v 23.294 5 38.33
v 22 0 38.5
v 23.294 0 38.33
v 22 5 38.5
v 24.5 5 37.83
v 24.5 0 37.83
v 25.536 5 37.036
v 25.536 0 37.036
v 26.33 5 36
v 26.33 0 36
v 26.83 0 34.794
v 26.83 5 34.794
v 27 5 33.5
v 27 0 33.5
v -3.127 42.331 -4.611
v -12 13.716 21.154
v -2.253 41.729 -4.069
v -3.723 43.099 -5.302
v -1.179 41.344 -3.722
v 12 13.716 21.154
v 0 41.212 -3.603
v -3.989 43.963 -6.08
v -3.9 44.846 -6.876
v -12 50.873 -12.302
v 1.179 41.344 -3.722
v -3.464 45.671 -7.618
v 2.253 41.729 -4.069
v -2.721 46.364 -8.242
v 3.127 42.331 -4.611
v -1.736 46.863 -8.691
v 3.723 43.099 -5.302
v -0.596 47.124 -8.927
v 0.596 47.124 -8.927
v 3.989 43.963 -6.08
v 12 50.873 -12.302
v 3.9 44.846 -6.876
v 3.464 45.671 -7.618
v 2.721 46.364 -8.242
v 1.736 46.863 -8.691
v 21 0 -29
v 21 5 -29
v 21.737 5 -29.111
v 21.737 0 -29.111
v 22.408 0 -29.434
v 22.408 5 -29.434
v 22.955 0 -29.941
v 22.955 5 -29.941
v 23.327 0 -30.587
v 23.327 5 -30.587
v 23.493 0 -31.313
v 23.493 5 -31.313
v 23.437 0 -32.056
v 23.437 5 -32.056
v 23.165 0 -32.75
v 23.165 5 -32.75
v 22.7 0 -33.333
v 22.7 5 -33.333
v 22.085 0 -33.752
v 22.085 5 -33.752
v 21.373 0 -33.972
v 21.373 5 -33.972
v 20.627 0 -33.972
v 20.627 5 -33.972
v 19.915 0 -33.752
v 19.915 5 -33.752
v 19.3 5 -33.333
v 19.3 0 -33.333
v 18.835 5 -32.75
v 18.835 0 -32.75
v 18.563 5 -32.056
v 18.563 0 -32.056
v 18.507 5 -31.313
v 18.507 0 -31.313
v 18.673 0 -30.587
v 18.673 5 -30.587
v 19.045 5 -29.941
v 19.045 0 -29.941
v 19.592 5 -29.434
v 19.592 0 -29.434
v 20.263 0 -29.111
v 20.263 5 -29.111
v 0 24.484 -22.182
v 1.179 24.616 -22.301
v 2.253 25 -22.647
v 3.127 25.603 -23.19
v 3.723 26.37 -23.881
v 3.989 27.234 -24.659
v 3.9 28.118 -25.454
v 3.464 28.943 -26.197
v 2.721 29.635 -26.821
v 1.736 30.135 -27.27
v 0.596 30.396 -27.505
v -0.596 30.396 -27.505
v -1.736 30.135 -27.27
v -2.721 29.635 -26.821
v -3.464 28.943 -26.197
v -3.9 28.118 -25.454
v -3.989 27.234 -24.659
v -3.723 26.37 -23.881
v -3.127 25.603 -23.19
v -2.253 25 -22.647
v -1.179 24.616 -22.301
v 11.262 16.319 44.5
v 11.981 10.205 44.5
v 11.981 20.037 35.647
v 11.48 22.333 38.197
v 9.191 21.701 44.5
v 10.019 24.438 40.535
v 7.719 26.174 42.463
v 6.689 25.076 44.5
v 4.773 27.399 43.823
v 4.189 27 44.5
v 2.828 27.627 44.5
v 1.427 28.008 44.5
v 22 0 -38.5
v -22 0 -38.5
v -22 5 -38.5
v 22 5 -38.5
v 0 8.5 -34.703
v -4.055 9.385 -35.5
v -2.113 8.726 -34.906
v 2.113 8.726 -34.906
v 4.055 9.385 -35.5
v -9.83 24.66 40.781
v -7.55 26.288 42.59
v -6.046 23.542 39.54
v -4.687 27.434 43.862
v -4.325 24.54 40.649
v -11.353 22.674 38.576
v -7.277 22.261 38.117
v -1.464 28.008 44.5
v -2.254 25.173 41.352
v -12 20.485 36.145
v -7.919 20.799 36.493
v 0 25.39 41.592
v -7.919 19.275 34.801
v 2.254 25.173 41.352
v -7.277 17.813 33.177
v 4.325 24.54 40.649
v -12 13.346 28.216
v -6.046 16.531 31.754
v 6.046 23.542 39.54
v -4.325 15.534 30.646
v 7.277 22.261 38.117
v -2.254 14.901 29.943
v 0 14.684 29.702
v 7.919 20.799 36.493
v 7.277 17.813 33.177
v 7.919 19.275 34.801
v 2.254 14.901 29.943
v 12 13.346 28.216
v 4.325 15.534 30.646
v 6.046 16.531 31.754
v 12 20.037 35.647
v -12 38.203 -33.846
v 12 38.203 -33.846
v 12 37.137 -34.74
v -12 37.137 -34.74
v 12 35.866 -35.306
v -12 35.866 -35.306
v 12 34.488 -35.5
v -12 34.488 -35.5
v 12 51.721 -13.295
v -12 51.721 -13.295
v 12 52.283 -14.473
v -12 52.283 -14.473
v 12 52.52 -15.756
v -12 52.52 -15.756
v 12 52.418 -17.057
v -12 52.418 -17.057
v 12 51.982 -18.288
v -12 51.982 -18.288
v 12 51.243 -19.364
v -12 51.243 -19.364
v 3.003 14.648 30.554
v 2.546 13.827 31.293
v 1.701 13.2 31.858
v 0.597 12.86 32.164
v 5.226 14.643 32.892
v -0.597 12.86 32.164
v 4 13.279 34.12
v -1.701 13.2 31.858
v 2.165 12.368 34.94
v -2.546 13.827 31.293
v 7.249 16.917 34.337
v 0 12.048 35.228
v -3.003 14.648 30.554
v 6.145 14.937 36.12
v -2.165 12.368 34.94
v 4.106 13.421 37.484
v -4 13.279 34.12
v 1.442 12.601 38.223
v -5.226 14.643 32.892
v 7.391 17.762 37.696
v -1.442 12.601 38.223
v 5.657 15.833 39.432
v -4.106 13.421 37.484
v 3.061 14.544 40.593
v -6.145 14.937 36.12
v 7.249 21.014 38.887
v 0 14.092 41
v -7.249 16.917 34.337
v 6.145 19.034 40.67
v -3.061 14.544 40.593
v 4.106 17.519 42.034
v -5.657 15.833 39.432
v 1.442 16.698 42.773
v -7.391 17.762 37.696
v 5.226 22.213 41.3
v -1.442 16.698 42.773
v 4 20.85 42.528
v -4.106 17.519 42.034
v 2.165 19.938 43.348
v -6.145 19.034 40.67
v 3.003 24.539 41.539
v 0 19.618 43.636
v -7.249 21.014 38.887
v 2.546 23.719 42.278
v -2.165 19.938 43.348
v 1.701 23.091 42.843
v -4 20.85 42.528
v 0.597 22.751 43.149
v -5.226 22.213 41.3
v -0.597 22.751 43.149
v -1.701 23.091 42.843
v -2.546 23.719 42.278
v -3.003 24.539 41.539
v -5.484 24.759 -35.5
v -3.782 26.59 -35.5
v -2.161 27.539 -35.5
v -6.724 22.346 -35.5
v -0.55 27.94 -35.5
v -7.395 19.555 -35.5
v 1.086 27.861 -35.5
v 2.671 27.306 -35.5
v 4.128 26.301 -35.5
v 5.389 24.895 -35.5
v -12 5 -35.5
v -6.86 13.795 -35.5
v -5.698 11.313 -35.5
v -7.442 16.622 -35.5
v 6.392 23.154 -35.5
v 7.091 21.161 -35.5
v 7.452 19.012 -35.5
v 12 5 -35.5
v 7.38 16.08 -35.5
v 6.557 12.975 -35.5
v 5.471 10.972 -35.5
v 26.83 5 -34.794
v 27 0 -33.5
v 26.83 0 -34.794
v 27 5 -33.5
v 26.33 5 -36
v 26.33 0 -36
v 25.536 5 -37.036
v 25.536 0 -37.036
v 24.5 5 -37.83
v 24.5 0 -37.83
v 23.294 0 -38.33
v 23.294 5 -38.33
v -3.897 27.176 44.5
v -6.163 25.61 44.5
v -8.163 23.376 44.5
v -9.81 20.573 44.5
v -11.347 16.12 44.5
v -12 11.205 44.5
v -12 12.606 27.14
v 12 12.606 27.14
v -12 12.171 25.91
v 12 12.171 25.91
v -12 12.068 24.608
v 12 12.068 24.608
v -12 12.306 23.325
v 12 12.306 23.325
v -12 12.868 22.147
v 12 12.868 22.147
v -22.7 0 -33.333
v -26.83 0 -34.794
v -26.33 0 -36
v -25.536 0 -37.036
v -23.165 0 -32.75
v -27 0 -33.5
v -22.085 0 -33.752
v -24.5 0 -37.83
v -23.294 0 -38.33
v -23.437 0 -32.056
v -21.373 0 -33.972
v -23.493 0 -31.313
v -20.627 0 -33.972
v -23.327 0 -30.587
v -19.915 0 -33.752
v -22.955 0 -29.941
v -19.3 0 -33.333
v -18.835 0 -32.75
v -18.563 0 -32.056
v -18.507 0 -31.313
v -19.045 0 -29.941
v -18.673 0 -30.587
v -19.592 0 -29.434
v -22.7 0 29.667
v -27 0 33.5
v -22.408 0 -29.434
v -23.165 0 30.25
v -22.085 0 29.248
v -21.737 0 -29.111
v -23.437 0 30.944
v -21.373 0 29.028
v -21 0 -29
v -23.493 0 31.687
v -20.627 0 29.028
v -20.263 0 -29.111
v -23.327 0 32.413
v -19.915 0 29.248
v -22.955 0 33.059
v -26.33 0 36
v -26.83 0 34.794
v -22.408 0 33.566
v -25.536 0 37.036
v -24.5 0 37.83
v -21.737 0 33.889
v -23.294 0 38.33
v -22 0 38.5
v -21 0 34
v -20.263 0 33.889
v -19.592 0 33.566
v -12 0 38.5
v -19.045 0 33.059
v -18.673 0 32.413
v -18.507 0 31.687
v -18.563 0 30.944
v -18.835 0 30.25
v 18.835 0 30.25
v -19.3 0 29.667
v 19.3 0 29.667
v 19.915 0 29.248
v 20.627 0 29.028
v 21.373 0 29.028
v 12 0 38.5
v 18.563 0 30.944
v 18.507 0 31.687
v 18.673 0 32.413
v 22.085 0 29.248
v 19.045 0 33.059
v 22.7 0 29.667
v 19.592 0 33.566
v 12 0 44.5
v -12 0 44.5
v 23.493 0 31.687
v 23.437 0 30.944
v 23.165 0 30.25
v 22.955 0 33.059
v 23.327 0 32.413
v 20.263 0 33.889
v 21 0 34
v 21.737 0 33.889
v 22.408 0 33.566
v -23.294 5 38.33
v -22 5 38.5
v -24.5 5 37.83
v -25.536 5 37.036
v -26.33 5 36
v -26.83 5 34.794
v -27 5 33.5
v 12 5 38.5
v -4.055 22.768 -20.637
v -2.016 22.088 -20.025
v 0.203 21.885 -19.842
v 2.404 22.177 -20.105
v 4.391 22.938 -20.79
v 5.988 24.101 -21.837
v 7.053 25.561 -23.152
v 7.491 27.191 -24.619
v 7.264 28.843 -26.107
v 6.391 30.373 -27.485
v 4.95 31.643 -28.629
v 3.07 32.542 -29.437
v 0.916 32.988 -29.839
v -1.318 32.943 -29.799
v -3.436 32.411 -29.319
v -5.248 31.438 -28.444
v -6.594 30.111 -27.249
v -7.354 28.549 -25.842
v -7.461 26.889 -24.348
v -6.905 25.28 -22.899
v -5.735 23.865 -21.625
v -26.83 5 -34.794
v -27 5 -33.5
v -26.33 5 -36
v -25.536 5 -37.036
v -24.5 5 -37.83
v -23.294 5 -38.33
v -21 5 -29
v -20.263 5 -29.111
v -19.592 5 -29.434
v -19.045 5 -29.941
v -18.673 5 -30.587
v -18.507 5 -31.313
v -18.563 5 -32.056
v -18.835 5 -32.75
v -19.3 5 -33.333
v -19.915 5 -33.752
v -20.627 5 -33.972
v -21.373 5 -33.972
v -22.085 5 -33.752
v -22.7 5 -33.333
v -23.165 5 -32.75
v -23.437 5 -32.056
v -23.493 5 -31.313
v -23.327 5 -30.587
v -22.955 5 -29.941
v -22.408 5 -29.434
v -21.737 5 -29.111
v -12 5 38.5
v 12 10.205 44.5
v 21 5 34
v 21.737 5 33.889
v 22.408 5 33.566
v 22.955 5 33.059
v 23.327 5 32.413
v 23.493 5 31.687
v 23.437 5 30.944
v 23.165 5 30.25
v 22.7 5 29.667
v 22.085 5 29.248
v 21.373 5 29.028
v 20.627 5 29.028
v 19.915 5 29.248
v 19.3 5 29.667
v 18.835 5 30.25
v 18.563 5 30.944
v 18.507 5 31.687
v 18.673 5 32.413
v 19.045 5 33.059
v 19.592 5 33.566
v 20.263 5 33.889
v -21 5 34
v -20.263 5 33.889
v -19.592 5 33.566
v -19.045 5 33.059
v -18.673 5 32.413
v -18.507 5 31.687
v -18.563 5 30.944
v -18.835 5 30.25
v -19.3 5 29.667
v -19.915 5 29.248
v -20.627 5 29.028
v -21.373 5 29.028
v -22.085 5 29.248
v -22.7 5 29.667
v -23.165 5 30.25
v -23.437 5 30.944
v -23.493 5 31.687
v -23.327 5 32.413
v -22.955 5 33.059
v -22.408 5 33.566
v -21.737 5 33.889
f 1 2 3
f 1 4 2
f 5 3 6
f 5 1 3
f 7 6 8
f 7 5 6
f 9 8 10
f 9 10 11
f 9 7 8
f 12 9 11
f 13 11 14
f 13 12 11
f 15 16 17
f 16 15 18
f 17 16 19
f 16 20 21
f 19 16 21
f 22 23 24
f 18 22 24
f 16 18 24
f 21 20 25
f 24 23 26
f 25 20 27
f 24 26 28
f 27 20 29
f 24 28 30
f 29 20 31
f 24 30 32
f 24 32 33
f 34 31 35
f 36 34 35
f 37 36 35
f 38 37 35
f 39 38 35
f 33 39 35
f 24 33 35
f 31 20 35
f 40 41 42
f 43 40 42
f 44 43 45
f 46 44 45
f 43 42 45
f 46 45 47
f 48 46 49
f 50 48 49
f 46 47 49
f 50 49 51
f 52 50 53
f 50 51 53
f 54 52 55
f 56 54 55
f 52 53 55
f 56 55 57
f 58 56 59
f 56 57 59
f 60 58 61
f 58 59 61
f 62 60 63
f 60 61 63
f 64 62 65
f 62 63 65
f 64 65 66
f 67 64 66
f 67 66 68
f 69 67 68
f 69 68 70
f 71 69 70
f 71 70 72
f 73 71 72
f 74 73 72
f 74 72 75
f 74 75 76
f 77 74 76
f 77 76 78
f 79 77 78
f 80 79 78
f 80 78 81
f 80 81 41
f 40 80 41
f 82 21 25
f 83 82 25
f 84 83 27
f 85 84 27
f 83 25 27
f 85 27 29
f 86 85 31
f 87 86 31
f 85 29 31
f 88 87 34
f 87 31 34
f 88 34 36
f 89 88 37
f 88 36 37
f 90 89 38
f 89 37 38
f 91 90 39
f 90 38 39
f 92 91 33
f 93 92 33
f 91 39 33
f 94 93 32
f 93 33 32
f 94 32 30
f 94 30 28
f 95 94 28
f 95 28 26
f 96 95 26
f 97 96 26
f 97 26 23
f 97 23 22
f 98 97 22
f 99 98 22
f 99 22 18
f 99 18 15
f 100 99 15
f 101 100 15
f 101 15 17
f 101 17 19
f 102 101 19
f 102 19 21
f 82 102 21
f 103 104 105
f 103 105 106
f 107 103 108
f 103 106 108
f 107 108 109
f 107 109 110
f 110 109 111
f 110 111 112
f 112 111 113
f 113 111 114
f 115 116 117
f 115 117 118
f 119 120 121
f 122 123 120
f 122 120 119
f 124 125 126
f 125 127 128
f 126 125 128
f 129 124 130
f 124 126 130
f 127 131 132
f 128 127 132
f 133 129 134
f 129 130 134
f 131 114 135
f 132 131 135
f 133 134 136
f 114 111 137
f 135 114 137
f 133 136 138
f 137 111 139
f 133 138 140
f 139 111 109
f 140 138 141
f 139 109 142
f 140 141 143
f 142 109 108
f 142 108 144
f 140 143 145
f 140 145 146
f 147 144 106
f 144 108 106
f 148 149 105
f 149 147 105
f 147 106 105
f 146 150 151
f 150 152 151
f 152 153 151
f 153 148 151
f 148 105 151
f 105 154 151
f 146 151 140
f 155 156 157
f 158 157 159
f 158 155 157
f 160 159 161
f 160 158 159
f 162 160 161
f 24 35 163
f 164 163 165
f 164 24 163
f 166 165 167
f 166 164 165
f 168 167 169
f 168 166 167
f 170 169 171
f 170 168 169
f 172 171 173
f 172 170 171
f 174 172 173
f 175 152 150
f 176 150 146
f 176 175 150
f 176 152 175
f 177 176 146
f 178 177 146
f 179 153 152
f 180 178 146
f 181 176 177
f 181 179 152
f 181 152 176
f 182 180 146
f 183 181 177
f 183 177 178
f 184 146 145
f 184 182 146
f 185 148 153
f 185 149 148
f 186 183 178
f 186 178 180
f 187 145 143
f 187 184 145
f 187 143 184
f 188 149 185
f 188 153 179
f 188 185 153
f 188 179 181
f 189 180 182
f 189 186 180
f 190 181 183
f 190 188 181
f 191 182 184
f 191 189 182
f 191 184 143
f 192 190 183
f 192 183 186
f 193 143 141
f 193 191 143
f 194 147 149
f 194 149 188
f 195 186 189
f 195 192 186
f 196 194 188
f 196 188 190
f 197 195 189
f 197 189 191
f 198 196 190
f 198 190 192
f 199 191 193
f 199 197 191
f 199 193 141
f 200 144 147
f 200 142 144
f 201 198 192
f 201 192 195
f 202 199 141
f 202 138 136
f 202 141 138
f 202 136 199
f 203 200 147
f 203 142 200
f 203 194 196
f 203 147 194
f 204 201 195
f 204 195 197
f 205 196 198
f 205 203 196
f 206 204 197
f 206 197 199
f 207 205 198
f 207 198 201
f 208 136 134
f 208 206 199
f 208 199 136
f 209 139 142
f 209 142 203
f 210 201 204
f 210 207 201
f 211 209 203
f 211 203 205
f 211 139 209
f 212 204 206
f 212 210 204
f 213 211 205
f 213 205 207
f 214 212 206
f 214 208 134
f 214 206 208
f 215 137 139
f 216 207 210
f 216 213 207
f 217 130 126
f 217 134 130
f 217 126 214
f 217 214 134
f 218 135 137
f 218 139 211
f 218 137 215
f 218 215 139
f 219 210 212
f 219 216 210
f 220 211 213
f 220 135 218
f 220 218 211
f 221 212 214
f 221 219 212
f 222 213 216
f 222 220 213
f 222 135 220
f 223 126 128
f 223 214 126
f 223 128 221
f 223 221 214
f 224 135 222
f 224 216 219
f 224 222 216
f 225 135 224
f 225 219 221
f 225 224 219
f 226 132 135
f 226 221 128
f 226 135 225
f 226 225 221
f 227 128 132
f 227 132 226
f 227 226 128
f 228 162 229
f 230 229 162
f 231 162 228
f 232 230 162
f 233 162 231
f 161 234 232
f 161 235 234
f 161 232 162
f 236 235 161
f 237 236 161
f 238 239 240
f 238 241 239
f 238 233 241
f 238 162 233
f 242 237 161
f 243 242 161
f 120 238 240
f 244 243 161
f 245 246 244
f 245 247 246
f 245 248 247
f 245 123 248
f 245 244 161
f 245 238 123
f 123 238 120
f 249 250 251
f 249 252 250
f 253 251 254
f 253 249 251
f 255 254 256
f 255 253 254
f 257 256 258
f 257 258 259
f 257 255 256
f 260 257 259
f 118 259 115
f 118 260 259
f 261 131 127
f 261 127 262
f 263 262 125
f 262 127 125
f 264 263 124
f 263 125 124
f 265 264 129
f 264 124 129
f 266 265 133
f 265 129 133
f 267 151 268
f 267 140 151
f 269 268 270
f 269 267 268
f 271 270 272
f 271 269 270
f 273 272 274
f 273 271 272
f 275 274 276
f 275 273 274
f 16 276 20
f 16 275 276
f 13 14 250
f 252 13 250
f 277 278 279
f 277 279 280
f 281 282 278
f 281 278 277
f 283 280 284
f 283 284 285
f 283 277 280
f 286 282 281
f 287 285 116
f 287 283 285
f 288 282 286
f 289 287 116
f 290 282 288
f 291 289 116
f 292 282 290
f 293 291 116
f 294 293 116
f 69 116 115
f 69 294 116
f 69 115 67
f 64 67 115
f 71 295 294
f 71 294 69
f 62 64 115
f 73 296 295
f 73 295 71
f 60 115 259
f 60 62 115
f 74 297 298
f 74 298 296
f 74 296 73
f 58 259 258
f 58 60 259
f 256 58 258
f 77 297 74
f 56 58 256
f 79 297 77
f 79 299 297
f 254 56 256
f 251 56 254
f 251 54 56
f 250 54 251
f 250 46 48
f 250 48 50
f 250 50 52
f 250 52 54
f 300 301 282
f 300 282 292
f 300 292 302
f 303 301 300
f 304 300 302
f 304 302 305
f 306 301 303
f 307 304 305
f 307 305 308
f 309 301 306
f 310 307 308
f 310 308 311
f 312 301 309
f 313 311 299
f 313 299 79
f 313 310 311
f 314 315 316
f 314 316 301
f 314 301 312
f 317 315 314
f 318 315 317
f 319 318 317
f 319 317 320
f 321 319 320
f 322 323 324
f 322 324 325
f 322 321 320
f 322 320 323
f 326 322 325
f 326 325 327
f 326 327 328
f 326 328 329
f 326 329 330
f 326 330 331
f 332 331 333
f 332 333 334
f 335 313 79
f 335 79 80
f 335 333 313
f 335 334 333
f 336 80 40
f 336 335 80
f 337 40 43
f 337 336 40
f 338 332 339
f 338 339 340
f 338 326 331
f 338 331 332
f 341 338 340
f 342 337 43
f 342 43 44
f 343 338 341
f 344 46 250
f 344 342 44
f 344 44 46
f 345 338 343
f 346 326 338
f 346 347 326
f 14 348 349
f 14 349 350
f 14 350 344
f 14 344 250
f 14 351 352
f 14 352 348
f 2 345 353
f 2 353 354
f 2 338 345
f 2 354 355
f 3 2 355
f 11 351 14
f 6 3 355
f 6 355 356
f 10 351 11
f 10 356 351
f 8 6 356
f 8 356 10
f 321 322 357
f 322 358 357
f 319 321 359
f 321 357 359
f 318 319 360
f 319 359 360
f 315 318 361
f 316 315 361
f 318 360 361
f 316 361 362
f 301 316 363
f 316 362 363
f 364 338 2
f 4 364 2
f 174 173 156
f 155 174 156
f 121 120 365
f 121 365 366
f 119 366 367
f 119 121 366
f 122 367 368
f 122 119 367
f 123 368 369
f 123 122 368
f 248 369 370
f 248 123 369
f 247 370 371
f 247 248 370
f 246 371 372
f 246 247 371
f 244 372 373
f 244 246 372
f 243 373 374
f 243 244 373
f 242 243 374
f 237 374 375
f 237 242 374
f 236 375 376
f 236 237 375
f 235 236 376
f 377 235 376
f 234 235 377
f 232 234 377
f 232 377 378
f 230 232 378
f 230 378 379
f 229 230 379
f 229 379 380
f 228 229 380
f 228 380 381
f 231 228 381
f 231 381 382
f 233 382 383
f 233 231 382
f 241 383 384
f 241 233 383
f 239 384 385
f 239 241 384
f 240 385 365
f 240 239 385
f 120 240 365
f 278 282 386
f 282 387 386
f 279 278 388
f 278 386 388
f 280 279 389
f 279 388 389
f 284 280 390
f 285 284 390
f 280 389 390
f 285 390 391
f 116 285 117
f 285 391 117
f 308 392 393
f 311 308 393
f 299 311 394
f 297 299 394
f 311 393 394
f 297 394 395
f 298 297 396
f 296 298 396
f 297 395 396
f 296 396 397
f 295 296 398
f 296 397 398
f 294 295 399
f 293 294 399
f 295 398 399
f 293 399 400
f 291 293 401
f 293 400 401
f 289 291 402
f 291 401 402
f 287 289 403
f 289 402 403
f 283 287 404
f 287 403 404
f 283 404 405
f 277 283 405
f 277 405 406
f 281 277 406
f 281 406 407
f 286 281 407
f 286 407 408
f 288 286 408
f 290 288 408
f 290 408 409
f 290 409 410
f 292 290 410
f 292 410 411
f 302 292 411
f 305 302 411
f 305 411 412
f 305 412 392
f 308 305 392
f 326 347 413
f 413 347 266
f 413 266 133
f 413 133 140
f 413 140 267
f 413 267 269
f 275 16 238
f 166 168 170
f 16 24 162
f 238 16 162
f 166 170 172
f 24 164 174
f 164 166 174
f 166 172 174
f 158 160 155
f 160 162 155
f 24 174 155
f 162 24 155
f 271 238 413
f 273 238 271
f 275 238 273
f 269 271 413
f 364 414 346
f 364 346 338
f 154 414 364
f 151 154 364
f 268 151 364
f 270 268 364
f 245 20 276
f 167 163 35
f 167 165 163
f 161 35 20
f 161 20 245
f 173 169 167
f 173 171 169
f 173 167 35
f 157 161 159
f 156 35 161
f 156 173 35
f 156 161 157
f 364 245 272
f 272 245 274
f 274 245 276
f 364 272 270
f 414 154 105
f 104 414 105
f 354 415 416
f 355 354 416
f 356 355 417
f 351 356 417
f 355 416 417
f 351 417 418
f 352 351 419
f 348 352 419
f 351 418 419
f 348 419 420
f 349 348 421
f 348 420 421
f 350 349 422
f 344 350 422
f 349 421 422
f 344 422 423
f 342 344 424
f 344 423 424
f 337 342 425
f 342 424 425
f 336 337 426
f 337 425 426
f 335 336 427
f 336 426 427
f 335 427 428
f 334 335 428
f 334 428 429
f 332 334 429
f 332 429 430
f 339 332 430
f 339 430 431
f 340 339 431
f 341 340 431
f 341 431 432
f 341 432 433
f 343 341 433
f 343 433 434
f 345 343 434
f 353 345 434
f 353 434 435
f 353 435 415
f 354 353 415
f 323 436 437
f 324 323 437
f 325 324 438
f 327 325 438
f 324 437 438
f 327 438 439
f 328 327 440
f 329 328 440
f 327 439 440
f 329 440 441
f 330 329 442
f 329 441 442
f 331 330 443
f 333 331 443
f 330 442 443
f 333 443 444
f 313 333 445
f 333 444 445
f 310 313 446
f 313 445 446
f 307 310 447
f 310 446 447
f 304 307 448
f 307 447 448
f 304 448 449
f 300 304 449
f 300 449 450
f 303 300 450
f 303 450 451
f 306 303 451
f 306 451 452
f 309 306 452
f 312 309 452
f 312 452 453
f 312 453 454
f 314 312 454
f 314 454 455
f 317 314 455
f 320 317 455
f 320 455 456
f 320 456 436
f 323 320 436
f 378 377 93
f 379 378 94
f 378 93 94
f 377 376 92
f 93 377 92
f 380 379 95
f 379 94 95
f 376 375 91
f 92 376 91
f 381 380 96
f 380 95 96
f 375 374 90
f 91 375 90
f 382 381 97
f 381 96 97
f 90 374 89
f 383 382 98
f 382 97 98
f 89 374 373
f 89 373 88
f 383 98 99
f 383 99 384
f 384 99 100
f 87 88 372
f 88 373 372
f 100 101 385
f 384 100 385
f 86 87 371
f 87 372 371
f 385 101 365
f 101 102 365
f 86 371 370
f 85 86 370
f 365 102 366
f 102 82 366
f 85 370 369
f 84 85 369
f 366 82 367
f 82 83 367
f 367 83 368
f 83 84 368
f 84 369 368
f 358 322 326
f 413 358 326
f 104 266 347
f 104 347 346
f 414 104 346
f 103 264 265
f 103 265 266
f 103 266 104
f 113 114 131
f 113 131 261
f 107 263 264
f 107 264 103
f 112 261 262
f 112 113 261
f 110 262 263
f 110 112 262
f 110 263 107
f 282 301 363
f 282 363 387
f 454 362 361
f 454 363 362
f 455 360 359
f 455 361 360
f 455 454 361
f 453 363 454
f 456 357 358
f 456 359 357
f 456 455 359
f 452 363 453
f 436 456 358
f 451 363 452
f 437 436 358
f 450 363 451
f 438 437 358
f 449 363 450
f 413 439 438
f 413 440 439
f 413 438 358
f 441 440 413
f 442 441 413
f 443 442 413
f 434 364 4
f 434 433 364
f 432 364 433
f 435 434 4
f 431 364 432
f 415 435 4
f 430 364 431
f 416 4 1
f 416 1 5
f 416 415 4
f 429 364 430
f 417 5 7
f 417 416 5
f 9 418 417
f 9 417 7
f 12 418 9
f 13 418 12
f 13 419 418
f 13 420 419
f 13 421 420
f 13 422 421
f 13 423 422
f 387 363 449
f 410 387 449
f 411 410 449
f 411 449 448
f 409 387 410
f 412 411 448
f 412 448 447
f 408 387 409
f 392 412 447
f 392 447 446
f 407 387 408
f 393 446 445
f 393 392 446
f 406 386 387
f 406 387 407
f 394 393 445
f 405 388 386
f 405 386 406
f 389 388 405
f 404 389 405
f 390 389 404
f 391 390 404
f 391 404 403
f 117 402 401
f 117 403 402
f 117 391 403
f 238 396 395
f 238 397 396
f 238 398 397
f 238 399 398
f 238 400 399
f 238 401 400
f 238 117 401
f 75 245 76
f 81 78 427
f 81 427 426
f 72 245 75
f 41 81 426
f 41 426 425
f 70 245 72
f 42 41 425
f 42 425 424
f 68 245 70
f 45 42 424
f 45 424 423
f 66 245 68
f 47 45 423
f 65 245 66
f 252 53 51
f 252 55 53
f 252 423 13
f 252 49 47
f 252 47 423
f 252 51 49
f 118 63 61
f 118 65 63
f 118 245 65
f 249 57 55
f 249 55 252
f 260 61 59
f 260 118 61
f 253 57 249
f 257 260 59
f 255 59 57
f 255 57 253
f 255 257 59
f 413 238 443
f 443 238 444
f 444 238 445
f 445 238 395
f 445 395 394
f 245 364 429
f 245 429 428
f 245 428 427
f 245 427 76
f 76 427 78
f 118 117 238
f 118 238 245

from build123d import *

# Parameters (mm, degrees)
SKETCH1_W                       = 54
SKETCH1_H                       = 77
BOSS_EXTRUDE1_DEPTH             = 5
SKETCH3_W                       = 24
SKETCH3_H                       = 80
BOSS_EXTRUDE2_DEPTH             = 60
BOSS_EXTRUDE2_DIRECTION_2_REACH = 49.289
CUT_EXTRUDE5_DEPTH              = 88.89908987
SKETCH9_R                       = 4
CUT_EXTRUDE7_DEPTH              = 74.599714303
FILLET4_R                       = 5
SKETCH10_R                      = 7.5
CUT_EXTRUDE8_DEPTH              = 20
F_5_0_5_DIAMETER_HOLE1_D        = 5
FILLET7_R                       = 5
CUT_EXTRUDE9_DEPTH              = 79.817150767


with BuildPart() as part:
    # Sketch1 → Boss-Extrude1 (new body)
    with BuildSketch(Plane(origin=(0, 0, 0), x_dir=(1, 0, 0), z_dir=(0, 1, 0))):
        Rectangle(SKETCH1_W, SKETCH1_H)
    extrude(amount=BOSS_EXTRUDE1_DEPTH)

    # Sketch3 → Boss-Extrude2 (add)
    with BuildSketch(Plane(origin=(0, 5, 0), x_dir=(1, 0, 0), z_dir=(0, 1, 0))):
        with Locations((0, -4.5)):
            Rectangle(SKETCH3_W, SKETCH3_H)
    extrude(amount=BOSS_EXTRUDE2_DEPTH)

    # Boss-Extrude2 direction 2: up to this face of the body (flat: up to its plane)
    boss_extrude2_direction_2_end = Plane(part.part.faces().sort_by_distance((0, 0, 0))[0])
    # Sketch3 → Boss-Extrude2 direction 2 (add, up to the picked face)
    with BuildSketch(Plane(origin=(0, 5, 0), x_dir=(1, 0, 0), z_dir=(0, 1, 0)), mode=Mode.PRIVATE) as boss_extrude2_direction_2_sk1:
        with Locations((0, -4.5)):
            Rectangle(SKETCH3_W, SKETCH3_H)
    boss_extrude2_direction_2_tool1 = split(extrude(boss_extrude2_direction_2_sk1.sketch, amount=-BOSS_EXTRUDE2_DIRECTION_2_REACH, mode=Mode.PRIVATE), bisect_by=boss_extrude2_direction_2_end, keep=Keep.BOTH, mode=Mode.PRIVATE)
    add(boss_extrude2_direction_2_tool1.solids().sort_by(Axis((0, 5, 4.5), (0, -1, 0)))[0])

    # Sketch7 → Cut-Extrude5 (cut, through all)
    with BuildSketch(Plane(origin=(12, 0, 0), x_dir=(0, 0, -1), z_dir=(1, 0, 0))):
        Polygon((-46.794344764, 30.073918191), (-24.5, 10), (15.647836382, 54.588689529), (50.5, 23.207660454), (50.5, 70), (-49.5, 70), (-49.5, 27.068983625), align=None)
    extrude(amount=-CUT_EXTRUDE5_DEPTH, mode=Mode.SUBTRACT)

    # Sketch9 → Cut-Extrude7 (cut, through all)
    with BuildSketch(Plane(origin=(0, 16.660250902, 18.503083152), x_dir=(1, 0, 0), z_dir=(0, 0.6691306063588566, 0.7431448254773958))):
        with Locations(Location((0, 37.037748399, 0), (0, 0, 270))):
            Circle(SKETCH9_R)
    extrude(amount=-CUT_EXTRUDE7_DEPTH, mode=Mode.SUBTRACT)

    # Fillet4
    fillet4_edges = [part.edges().sort_by_distance(p)[0] for p in [
        (0, 36.713721119, -35.5),
        (0, 54.588689529, -15.647836382),
        (0, 10, 24.5),
    ]]
    fillet(fillet4_edges, radius=FILLET4_R)

    # Sketch10 → Cut-Extrude8 (cut)
    with BuildSketch(Plane(origin=(0, -13.450626384, -14.938433995), x_dir=(1, 0, 0), z_dir=(0, 0.6691306063588566, 0.7431448254773958))):
        with Locations(Location((0, 37.037748399, 0), (0, 0, 237.266633069))):
            Circle(SKETCH10_R)
    extrude(amount=CUT_EXTRUDE8_DEPTH, mode=Mode.SUBTRACT)

    # Ø5.0 (5) Diameter Hole1 (through all)
    with Locations(Plane(origin=(21, 0, -31.5), x_dir=(0, 0, -1), z_dir=(0, -1, 0))):
        with Locations((0, 0), (0, -42), (-63, -42), (-63, 0)):
            Hole(F_5_0_5_DIAMETER_HOLE1_D / 2)

    # Fillet7
    fillet7_edges = [part.edges().sort_by_distance(p)[0] for p in [
        (27, 2.5, 38.5),
        (-27, 2.5, 38.5),
        (-27, 2.5, -38.5),
        (27, 2.5, -38.5),
    ]]
    fillet(fillet7_edges, radius=FILLET7_R)

    # Sketch8 → Cut-Revolve4 (revolve, cut)
    with BuildSketch(Plane(origin=(0, -6.660250902, 5.996916848), x_dir=(1, 0, 0), z_dir=(0, 0.7431448254773959, -0.6691306063588564))):
        with BuildLine():
            Line((0, -47.898354288), (0, -31.898354288))
            ThreePointArc((0, -31.898354288), (8, -39.898354288), (0, -47.898354288))
        make_face()
    revolve(axis=Axis((0, 28.008080886, 44.5), (0, -0.6691306063588564, -0.7431448254773959)), mode=Mode.SUBTRACT)

    # Sketch13 → Cut-Extrude9 (cut, through all)
    with BuildSketch(Plane(origin=(0, -6.660250902, 5.996916848), x_dir=(1, 0, 0), z_dir=(0, 0.7431448254773957, -0.6691306063588566))):
        with BuildLine():
            Line((-12.01867578, -39.898354288), (-15.599845955, -39.898354288))
            Line((-15.599845955, -39.898354288), (-15.599845955, -55.363727993))
            Line((-15.599845955, -55.363727993), (15.599845955, -55.363727993))
            Line((15.599845955, -55.363727993), (15.599845955, -39.898354288))
            Line((15.599845955, -39.898354288), (11.98132422, -39.898354288))
            ThreePointArc((11.98132422, -39.898354288), (-0.01867578, -51.898354288), (-12.01867578, -39.898354288))
        make_face()
    extrude(amount=-CUT_EXTRUDE9_DEPTH, mode=Mode.SUBTRACT)


solid = part.part
